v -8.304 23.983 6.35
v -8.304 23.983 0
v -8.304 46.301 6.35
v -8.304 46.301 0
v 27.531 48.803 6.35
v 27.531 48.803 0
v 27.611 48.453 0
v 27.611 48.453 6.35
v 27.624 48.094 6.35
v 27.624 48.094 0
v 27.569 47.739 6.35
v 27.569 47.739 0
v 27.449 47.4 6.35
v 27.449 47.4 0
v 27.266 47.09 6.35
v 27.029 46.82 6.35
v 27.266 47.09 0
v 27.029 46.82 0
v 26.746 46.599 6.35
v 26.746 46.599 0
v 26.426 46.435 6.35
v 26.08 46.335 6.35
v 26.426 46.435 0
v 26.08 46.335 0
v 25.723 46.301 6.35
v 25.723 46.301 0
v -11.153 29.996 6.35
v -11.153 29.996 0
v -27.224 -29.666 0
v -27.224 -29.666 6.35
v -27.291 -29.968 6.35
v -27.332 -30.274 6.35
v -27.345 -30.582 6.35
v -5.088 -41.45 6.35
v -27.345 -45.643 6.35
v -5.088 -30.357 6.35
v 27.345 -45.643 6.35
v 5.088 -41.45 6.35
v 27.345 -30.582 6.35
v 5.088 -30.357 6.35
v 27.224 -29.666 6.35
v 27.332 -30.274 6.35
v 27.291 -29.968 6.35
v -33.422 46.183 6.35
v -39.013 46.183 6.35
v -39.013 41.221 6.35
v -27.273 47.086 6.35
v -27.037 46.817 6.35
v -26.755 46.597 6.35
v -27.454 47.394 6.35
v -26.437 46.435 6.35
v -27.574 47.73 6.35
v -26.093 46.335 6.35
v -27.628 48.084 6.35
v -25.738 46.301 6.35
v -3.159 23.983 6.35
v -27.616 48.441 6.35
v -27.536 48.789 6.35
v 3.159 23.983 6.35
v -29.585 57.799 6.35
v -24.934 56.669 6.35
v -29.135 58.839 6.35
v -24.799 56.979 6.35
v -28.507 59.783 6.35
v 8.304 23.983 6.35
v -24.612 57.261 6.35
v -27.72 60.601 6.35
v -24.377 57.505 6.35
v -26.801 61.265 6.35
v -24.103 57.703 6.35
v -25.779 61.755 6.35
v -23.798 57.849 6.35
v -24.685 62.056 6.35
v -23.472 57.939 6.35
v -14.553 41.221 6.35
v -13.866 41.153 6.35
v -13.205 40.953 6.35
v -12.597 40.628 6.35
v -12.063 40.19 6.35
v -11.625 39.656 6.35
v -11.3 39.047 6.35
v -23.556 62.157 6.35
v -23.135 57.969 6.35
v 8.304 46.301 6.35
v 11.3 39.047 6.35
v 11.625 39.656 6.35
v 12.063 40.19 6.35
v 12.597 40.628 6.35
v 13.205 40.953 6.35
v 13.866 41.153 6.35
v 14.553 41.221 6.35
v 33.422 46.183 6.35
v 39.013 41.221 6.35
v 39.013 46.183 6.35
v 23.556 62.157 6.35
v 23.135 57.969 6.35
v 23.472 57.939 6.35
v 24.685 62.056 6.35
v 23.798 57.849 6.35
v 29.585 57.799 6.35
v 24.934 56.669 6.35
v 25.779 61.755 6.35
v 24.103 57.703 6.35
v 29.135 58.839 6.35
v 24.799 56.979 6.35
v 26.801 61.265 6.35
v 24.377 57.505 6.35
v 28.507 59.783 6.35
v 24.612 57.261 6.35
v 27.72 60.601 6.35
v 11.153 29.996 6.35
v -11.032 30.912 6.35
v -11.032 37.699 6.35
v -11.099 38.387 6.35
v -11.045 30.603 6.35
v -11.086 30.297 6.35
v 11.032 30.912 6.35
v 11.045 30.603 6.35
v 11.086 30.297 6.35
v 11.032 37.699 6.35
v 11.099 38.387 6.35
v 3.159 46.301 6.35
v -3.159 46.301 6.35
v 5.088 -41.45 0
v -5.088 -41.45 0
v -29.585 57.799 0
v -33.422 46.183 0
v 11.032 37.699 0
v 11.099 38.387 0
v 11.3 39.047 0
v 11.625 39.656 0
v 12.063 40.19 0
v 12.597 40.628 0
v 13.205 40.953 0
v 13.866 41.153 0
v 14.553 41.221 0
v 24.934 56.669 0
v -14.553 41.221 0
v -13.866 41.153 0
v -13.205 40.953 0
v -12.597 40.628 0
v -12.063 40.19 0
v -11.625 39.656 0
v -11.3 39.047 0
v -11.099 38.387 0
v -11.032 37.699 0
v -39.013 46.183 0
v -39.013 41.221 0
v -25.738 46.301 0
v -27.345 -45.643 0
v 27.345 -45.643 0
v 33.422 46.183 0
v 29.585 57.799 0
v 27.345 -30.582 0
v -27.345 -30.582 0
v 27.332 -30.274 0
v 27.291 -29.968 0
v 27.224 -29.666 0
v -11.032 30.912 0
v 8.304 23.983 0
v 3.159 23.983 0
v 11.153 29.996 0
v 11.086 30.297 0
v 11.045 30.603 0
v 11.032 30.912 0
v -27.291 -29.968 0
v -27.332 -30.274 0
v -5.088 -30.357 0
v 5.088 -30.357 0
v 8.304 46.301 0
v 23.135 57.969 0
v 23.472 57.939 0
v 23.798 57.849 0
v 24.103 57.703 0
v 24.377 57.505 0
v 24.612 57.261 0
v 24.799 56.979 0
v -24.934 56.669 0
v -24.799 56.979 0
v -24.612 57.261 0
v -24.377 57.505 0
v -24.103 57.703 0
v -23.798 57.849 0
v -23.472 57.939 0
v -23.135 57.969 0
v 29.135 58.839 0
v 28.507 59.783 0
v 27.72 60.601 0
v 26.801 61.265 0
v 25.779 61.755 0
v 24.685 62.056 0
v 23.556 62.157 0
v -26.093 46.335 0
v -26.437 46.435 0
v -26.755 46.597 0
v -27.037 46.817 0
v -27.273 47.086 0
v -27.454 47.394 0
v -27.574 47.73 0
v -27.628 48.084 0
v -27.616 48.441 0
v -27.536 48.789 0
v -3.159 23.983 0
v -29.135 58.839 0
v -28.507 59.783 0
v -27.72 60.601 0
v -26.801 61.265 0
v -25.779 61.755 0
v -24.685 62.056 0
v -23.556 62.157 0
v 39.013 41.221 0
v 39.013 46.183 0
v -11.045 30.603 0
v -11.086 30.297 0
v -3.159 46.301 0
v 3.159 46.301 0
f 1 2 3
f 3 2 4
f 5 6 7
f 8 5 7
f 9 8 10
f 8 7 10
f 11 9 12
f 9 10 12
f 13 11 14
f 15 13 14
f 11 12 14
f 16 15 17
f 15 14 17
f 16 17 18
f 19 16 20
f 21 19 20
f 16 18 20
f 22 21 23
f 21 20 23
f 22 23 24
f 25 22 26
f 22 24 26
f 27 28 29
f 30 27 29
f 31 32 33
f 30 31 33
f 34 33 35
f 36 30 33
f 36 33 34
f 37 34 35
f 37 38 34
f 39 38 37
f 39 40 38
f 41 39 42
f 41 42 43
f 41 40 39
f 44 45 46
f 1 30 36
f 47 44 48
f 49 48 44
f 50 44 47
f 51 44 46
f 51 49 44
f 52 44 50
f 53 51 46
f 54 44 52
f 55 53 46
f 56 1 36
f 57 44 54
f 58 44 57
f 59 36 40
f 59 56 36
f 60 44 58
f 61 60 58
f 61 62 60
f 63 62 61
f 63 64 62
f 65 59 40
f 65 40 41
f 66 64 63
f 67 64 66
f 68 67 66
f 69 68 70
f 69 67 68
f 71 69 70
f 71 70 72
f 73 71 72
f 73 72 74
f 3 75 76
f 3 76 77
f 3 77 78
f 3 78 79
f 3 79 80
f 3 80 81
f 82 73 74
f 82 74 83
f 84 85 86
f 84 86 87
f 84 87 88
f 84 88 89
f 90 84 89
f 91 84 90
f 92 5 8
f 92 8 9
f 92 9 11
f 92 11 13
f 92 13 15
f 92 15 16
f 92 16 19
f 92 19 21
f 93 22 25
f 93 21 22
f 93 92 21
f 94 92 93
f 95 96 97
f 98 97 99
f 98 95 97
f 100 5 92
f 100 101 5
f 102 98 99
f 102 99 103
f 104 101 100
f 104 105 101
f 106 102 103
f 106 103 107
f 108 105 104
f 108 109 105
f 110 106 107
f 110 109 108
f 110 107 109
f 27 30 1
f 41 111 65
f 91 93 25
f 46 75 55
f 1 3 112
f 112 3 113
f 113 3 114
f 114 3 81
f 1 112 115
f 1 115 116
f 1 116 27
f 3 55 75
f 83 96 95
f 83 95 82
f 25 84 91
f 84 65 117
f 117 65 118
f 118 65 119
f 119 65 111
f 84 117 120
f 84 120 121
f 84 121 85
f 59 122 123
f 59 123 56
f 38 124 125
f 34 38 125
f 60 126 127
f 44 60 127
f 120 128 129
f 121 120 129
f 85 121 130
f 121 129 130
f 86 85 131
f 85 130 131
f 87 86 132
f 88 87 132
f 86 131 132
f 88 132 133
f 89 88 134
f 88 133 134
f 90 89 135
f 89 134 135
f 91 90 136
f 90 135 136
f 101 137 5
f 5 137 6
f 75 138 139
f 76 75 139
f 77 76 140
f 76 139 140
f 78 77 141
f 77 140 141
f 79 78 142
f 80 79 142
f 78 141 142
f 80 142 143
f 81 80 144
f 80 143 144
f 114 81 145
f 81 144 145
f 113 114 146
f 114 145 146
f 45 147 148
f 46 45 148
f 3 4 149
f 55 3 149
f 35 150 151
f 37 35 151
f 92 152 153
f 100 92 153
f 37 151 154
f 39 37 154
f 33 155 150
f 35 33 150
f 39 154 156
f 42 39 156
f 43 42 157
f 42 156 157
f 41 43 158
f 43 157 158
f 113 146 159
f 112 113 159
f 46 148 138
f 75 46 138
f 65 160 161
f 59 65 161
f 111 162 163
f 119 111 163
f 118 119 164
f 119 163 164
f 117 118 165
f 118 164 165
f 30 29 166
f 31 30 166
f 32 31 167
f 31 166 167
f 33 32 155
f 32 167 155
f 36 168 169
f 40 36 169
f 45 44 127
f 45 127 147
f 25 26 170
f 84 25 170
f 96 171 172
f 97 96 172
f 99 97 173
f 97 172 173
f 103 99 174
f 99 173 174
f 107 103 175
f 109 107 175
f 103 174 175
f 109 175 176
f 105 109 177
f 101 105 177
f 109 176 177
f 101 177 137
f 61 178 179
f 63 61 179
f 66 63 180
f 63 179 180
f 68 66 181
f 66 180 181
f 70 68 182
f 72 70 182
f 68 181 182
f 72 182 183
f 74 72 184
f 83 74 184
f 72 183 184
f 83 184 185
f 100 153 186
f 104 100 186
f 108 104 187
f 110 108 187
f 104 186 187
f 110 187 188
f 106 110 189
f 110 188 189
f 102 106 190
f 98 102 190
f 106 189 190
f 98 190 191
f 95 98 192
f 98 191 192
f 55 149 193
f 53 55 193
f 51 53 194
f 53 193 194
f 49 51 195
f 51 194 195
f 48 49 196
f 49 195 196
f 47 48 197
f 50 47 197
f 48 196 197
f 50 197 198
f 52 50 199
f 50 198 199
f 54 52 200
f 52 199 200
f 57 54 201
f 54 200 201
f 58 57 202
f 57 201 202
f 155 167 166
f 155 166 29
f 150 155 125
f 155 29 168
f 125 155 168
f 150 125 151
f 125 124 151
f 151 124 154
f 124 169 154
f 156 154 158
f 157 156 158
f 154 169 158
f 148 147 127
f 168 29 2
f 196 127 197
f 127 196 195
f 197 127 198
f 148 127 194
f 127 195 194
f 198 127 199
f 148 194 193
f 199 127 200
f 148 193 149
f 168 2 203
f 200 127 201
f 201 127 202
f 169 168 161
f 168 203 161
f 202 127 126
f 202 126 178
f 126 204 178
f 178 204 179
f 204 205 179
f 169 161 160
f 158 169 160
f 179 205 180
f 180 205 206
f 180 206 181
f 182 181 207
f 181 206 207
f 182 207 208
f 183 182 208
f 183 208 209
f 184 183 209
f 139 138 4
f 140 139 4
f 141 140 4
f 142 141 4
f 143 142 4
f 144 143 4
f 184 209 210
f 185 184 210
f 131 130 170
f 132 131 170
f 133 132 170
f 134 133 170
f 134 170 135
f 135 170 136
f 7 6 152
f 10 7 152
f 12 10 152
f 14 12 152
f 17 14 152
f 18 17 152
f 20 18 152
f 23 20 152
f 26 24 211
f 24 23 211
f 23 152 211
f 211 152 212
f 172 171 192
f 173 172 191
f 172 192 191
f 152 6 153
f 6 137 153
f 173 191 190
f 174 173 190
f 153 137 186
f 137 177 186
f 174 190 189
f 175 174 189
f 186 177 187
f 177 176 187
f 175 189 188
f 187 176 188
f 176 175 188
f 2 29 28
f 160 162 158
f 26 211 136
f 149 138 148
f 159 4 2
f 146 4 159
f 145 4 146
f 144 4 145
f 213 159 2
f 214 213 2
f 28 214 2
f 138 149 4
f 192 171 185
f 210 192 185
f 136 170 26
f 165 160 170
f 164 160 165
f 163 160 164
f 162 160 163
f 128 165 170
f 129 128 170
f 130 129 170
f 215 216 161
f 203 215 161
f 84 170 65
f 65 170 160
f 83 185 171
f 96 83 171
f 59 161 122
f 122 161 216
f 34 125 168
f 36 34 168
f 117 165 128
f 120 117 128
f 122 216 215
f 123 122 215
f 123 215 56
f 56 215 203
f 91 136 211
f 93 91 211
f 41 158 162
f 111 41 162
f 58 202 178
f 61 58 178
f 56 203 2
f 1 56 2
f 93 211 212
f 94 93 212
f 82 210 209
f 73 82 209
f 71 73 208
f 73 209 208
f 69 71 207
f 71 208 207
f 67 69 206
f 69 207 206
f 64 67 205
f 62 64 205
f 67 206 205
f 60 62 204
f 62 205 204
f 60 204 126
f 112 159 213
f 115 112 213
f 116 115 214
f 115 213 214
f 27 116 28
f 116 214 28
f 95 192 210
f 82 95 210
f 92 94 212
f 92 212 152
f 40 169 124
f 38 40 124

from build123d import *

# Parameters (mm, degrees)
F1_DEPTH = 6.35


with BuildPart() as f1:
    # F0 (on Top) → F1 (new body)
    with BuildSketch(Plane.XY):
        with BuildLine():
            ThreePointArc((-33.4219, 43.115239), (-32.867102, 41.775839), (-31.527702, 41.221041))
            Line((-31.527702, 41.221041), (-25.33034, 41.221041))
            Line((-25.33034, 41.221041), (-14.553085, 41.221041))
            ThreePointArc((-14.553085, 41.221041), (-12.062966, 40.1896), (-11.031525, 37.699481))
            Line((-11.031525, 37.699481), (-11.031525, 30.911574))
            ThreePointArc((-11.031525, 30.911574), (-11.061958, 30.449601), (-11.152732, 29.995613))
            Line((-11.152732, 29.995613), (-27.223983, -29.666242))
            ThreePointArc((-27.223983, -29.666242), (-27.314757, -30.12023), (-27.34519, -30.582203))
            Line((-27.34519, -30.582203), (-27.34519, -45.643087))
            Line((-27.34519, -45.643087), (0, -45.643087))
            Line((0, -45.643087), (27.34519, -45.643087))
            Line((27.34519, -45.643087), (27.34519, -30.582203))
            ThreePointArc((27.34519, -30.582203), (27.314757, -30.12023), (27.223983, -29.666242))
            Line((27.223983, -29.666242), (11.152732, 29.995613))
            ThreePointArc((11.152732, 29.995613), (11.061958, 30.449601), (11.031525, 30.911574))
            Line((11.031525, 30.911574), (11.031525, 37.699481))
            ThreePointArc((11.031525, 37.699481), (12.062966, 40.1896), (14.553085, 41.221041))
            Line((14.553085, 41.221041), (25.33034, 41.221041))
            Line((25.33034, 41.221041), (31.527702, 41.221041))
            ThreePointArc((31.527702, 41.221041), (32.867102, 41.775839), (33.4219, 43.115239))
            Line((33.4219, 43.115239), (33.4219, 46.182986))
            Line((33.4219, 46.182986), (29.585455, 57.798627))
            ThreePointArc((29.585455, 57.798627), (27.275806, 60.953424), (23.555821, 62.157143))
            Line((23.555821, 62.157143), (0, 62.157143))
            Line((0, 62.157143), (-23.555821, 62.157143))
            ThreePointArc((-23.555821, 62.157143), (-27.275806, 60.953424), (-29.585455, 57.798627))
            Line((-29.585455, 57.798627), (-33.4219, 46.182986))
            Line((-33.4219, 46.182986), (-33.4219, 43.115239))
        make_face()
        Polygon((-5.088463, -30.357072), (0, -30.357072), (5.088463, -30.357072), (5.088463, -41.450173), (0, -41.450173), (-5.088463, -41.450173), align=None, mode=Mode.SUBTRACT)
        with BuildLine():
            Line((-8.303855, 46.301041), (-25.737514, 46.301041))
            ThreePointArc((-25.737514, 46.301041), (-27.272644, 47.085572), (-27.536148, 48.789297))
            Line((-27.536148, 48.789297), (-24.933654, 56.66889))
            ThreePointArc((-24.933654, 56.66889), (-24.244688, 57.609963), (-23.135021, 57.969031))
            Line((-23.135021, 57.969031), (0, 57.969031))
            Line((0, 57.969031), (23.135021, 57.969031))
            ThreePointArc((23.135021, 57.969031), (24.244688, 57.609963), (24.933654, 56.66889))
            Line((24.933654, 56.66889), (27.531461, 48.803486))
            ThreePointArc((27.531461, 48.803486), (27.266455, 47.090046), (25.722571, 46.301041))
            Line((25.722571, 46.301041), (8.303855, 46.301041))
            Line((8.303855, 46.301041), (8.303855, 23.983043))
            Line((8.303855, 23.983043), (3.15923, 23.983043))
            Line((3.15923, 23.983043), (3.15923, 46.301041))
            Line((3.15923, 46.301041), (0, 46.301041))
            Line((0, 46.301041), (-3.15923, 46.301041))
            Line((-3.15923, 46.301041), (-3.15923, 23.983043))
            Line((-3.15923, 23.983043), (-8.303855, 23.983043))
            Line((-8.303855, 23.983043), (-8.303855, 46.301041))
        make_face(mode=Mode.SUBTRACT)
        with BuildLine():
            Line((-39.013032, 41.221041), (-31.527702, 41.221041))
            ThreePointArc((-31.527702, 41.221041), (-32.867102, 41.775839), (-33.4219, 43.115239))
            Line((-33.4219, 43.115239), (-33.4219, 46.182986))
            Line((-33.4219, 46.182986), (-39.013032, 46.182986))
            Line((-39.013032, 46.182986), (-39.013032, 41.221041))
        make_face()
        with BuildLine():
            Line((39.013032, 46.182986), (33.4219, 46.182986))
            Line((33.4219, 46.182986), (33.4219, 43.115239))
            ThreePointArc((33.4219, 43.115239), (32.867102, 41.775839), (31.527702, 41.221041))
            Line((31.527702, 41.221041), (39.013032, 41.221041))
            Line((39.013032, 41.221041), (39.013032, 46.182986))
        make_face()
    extrude(amount=F1_DEPTH)


solid = f1.part
